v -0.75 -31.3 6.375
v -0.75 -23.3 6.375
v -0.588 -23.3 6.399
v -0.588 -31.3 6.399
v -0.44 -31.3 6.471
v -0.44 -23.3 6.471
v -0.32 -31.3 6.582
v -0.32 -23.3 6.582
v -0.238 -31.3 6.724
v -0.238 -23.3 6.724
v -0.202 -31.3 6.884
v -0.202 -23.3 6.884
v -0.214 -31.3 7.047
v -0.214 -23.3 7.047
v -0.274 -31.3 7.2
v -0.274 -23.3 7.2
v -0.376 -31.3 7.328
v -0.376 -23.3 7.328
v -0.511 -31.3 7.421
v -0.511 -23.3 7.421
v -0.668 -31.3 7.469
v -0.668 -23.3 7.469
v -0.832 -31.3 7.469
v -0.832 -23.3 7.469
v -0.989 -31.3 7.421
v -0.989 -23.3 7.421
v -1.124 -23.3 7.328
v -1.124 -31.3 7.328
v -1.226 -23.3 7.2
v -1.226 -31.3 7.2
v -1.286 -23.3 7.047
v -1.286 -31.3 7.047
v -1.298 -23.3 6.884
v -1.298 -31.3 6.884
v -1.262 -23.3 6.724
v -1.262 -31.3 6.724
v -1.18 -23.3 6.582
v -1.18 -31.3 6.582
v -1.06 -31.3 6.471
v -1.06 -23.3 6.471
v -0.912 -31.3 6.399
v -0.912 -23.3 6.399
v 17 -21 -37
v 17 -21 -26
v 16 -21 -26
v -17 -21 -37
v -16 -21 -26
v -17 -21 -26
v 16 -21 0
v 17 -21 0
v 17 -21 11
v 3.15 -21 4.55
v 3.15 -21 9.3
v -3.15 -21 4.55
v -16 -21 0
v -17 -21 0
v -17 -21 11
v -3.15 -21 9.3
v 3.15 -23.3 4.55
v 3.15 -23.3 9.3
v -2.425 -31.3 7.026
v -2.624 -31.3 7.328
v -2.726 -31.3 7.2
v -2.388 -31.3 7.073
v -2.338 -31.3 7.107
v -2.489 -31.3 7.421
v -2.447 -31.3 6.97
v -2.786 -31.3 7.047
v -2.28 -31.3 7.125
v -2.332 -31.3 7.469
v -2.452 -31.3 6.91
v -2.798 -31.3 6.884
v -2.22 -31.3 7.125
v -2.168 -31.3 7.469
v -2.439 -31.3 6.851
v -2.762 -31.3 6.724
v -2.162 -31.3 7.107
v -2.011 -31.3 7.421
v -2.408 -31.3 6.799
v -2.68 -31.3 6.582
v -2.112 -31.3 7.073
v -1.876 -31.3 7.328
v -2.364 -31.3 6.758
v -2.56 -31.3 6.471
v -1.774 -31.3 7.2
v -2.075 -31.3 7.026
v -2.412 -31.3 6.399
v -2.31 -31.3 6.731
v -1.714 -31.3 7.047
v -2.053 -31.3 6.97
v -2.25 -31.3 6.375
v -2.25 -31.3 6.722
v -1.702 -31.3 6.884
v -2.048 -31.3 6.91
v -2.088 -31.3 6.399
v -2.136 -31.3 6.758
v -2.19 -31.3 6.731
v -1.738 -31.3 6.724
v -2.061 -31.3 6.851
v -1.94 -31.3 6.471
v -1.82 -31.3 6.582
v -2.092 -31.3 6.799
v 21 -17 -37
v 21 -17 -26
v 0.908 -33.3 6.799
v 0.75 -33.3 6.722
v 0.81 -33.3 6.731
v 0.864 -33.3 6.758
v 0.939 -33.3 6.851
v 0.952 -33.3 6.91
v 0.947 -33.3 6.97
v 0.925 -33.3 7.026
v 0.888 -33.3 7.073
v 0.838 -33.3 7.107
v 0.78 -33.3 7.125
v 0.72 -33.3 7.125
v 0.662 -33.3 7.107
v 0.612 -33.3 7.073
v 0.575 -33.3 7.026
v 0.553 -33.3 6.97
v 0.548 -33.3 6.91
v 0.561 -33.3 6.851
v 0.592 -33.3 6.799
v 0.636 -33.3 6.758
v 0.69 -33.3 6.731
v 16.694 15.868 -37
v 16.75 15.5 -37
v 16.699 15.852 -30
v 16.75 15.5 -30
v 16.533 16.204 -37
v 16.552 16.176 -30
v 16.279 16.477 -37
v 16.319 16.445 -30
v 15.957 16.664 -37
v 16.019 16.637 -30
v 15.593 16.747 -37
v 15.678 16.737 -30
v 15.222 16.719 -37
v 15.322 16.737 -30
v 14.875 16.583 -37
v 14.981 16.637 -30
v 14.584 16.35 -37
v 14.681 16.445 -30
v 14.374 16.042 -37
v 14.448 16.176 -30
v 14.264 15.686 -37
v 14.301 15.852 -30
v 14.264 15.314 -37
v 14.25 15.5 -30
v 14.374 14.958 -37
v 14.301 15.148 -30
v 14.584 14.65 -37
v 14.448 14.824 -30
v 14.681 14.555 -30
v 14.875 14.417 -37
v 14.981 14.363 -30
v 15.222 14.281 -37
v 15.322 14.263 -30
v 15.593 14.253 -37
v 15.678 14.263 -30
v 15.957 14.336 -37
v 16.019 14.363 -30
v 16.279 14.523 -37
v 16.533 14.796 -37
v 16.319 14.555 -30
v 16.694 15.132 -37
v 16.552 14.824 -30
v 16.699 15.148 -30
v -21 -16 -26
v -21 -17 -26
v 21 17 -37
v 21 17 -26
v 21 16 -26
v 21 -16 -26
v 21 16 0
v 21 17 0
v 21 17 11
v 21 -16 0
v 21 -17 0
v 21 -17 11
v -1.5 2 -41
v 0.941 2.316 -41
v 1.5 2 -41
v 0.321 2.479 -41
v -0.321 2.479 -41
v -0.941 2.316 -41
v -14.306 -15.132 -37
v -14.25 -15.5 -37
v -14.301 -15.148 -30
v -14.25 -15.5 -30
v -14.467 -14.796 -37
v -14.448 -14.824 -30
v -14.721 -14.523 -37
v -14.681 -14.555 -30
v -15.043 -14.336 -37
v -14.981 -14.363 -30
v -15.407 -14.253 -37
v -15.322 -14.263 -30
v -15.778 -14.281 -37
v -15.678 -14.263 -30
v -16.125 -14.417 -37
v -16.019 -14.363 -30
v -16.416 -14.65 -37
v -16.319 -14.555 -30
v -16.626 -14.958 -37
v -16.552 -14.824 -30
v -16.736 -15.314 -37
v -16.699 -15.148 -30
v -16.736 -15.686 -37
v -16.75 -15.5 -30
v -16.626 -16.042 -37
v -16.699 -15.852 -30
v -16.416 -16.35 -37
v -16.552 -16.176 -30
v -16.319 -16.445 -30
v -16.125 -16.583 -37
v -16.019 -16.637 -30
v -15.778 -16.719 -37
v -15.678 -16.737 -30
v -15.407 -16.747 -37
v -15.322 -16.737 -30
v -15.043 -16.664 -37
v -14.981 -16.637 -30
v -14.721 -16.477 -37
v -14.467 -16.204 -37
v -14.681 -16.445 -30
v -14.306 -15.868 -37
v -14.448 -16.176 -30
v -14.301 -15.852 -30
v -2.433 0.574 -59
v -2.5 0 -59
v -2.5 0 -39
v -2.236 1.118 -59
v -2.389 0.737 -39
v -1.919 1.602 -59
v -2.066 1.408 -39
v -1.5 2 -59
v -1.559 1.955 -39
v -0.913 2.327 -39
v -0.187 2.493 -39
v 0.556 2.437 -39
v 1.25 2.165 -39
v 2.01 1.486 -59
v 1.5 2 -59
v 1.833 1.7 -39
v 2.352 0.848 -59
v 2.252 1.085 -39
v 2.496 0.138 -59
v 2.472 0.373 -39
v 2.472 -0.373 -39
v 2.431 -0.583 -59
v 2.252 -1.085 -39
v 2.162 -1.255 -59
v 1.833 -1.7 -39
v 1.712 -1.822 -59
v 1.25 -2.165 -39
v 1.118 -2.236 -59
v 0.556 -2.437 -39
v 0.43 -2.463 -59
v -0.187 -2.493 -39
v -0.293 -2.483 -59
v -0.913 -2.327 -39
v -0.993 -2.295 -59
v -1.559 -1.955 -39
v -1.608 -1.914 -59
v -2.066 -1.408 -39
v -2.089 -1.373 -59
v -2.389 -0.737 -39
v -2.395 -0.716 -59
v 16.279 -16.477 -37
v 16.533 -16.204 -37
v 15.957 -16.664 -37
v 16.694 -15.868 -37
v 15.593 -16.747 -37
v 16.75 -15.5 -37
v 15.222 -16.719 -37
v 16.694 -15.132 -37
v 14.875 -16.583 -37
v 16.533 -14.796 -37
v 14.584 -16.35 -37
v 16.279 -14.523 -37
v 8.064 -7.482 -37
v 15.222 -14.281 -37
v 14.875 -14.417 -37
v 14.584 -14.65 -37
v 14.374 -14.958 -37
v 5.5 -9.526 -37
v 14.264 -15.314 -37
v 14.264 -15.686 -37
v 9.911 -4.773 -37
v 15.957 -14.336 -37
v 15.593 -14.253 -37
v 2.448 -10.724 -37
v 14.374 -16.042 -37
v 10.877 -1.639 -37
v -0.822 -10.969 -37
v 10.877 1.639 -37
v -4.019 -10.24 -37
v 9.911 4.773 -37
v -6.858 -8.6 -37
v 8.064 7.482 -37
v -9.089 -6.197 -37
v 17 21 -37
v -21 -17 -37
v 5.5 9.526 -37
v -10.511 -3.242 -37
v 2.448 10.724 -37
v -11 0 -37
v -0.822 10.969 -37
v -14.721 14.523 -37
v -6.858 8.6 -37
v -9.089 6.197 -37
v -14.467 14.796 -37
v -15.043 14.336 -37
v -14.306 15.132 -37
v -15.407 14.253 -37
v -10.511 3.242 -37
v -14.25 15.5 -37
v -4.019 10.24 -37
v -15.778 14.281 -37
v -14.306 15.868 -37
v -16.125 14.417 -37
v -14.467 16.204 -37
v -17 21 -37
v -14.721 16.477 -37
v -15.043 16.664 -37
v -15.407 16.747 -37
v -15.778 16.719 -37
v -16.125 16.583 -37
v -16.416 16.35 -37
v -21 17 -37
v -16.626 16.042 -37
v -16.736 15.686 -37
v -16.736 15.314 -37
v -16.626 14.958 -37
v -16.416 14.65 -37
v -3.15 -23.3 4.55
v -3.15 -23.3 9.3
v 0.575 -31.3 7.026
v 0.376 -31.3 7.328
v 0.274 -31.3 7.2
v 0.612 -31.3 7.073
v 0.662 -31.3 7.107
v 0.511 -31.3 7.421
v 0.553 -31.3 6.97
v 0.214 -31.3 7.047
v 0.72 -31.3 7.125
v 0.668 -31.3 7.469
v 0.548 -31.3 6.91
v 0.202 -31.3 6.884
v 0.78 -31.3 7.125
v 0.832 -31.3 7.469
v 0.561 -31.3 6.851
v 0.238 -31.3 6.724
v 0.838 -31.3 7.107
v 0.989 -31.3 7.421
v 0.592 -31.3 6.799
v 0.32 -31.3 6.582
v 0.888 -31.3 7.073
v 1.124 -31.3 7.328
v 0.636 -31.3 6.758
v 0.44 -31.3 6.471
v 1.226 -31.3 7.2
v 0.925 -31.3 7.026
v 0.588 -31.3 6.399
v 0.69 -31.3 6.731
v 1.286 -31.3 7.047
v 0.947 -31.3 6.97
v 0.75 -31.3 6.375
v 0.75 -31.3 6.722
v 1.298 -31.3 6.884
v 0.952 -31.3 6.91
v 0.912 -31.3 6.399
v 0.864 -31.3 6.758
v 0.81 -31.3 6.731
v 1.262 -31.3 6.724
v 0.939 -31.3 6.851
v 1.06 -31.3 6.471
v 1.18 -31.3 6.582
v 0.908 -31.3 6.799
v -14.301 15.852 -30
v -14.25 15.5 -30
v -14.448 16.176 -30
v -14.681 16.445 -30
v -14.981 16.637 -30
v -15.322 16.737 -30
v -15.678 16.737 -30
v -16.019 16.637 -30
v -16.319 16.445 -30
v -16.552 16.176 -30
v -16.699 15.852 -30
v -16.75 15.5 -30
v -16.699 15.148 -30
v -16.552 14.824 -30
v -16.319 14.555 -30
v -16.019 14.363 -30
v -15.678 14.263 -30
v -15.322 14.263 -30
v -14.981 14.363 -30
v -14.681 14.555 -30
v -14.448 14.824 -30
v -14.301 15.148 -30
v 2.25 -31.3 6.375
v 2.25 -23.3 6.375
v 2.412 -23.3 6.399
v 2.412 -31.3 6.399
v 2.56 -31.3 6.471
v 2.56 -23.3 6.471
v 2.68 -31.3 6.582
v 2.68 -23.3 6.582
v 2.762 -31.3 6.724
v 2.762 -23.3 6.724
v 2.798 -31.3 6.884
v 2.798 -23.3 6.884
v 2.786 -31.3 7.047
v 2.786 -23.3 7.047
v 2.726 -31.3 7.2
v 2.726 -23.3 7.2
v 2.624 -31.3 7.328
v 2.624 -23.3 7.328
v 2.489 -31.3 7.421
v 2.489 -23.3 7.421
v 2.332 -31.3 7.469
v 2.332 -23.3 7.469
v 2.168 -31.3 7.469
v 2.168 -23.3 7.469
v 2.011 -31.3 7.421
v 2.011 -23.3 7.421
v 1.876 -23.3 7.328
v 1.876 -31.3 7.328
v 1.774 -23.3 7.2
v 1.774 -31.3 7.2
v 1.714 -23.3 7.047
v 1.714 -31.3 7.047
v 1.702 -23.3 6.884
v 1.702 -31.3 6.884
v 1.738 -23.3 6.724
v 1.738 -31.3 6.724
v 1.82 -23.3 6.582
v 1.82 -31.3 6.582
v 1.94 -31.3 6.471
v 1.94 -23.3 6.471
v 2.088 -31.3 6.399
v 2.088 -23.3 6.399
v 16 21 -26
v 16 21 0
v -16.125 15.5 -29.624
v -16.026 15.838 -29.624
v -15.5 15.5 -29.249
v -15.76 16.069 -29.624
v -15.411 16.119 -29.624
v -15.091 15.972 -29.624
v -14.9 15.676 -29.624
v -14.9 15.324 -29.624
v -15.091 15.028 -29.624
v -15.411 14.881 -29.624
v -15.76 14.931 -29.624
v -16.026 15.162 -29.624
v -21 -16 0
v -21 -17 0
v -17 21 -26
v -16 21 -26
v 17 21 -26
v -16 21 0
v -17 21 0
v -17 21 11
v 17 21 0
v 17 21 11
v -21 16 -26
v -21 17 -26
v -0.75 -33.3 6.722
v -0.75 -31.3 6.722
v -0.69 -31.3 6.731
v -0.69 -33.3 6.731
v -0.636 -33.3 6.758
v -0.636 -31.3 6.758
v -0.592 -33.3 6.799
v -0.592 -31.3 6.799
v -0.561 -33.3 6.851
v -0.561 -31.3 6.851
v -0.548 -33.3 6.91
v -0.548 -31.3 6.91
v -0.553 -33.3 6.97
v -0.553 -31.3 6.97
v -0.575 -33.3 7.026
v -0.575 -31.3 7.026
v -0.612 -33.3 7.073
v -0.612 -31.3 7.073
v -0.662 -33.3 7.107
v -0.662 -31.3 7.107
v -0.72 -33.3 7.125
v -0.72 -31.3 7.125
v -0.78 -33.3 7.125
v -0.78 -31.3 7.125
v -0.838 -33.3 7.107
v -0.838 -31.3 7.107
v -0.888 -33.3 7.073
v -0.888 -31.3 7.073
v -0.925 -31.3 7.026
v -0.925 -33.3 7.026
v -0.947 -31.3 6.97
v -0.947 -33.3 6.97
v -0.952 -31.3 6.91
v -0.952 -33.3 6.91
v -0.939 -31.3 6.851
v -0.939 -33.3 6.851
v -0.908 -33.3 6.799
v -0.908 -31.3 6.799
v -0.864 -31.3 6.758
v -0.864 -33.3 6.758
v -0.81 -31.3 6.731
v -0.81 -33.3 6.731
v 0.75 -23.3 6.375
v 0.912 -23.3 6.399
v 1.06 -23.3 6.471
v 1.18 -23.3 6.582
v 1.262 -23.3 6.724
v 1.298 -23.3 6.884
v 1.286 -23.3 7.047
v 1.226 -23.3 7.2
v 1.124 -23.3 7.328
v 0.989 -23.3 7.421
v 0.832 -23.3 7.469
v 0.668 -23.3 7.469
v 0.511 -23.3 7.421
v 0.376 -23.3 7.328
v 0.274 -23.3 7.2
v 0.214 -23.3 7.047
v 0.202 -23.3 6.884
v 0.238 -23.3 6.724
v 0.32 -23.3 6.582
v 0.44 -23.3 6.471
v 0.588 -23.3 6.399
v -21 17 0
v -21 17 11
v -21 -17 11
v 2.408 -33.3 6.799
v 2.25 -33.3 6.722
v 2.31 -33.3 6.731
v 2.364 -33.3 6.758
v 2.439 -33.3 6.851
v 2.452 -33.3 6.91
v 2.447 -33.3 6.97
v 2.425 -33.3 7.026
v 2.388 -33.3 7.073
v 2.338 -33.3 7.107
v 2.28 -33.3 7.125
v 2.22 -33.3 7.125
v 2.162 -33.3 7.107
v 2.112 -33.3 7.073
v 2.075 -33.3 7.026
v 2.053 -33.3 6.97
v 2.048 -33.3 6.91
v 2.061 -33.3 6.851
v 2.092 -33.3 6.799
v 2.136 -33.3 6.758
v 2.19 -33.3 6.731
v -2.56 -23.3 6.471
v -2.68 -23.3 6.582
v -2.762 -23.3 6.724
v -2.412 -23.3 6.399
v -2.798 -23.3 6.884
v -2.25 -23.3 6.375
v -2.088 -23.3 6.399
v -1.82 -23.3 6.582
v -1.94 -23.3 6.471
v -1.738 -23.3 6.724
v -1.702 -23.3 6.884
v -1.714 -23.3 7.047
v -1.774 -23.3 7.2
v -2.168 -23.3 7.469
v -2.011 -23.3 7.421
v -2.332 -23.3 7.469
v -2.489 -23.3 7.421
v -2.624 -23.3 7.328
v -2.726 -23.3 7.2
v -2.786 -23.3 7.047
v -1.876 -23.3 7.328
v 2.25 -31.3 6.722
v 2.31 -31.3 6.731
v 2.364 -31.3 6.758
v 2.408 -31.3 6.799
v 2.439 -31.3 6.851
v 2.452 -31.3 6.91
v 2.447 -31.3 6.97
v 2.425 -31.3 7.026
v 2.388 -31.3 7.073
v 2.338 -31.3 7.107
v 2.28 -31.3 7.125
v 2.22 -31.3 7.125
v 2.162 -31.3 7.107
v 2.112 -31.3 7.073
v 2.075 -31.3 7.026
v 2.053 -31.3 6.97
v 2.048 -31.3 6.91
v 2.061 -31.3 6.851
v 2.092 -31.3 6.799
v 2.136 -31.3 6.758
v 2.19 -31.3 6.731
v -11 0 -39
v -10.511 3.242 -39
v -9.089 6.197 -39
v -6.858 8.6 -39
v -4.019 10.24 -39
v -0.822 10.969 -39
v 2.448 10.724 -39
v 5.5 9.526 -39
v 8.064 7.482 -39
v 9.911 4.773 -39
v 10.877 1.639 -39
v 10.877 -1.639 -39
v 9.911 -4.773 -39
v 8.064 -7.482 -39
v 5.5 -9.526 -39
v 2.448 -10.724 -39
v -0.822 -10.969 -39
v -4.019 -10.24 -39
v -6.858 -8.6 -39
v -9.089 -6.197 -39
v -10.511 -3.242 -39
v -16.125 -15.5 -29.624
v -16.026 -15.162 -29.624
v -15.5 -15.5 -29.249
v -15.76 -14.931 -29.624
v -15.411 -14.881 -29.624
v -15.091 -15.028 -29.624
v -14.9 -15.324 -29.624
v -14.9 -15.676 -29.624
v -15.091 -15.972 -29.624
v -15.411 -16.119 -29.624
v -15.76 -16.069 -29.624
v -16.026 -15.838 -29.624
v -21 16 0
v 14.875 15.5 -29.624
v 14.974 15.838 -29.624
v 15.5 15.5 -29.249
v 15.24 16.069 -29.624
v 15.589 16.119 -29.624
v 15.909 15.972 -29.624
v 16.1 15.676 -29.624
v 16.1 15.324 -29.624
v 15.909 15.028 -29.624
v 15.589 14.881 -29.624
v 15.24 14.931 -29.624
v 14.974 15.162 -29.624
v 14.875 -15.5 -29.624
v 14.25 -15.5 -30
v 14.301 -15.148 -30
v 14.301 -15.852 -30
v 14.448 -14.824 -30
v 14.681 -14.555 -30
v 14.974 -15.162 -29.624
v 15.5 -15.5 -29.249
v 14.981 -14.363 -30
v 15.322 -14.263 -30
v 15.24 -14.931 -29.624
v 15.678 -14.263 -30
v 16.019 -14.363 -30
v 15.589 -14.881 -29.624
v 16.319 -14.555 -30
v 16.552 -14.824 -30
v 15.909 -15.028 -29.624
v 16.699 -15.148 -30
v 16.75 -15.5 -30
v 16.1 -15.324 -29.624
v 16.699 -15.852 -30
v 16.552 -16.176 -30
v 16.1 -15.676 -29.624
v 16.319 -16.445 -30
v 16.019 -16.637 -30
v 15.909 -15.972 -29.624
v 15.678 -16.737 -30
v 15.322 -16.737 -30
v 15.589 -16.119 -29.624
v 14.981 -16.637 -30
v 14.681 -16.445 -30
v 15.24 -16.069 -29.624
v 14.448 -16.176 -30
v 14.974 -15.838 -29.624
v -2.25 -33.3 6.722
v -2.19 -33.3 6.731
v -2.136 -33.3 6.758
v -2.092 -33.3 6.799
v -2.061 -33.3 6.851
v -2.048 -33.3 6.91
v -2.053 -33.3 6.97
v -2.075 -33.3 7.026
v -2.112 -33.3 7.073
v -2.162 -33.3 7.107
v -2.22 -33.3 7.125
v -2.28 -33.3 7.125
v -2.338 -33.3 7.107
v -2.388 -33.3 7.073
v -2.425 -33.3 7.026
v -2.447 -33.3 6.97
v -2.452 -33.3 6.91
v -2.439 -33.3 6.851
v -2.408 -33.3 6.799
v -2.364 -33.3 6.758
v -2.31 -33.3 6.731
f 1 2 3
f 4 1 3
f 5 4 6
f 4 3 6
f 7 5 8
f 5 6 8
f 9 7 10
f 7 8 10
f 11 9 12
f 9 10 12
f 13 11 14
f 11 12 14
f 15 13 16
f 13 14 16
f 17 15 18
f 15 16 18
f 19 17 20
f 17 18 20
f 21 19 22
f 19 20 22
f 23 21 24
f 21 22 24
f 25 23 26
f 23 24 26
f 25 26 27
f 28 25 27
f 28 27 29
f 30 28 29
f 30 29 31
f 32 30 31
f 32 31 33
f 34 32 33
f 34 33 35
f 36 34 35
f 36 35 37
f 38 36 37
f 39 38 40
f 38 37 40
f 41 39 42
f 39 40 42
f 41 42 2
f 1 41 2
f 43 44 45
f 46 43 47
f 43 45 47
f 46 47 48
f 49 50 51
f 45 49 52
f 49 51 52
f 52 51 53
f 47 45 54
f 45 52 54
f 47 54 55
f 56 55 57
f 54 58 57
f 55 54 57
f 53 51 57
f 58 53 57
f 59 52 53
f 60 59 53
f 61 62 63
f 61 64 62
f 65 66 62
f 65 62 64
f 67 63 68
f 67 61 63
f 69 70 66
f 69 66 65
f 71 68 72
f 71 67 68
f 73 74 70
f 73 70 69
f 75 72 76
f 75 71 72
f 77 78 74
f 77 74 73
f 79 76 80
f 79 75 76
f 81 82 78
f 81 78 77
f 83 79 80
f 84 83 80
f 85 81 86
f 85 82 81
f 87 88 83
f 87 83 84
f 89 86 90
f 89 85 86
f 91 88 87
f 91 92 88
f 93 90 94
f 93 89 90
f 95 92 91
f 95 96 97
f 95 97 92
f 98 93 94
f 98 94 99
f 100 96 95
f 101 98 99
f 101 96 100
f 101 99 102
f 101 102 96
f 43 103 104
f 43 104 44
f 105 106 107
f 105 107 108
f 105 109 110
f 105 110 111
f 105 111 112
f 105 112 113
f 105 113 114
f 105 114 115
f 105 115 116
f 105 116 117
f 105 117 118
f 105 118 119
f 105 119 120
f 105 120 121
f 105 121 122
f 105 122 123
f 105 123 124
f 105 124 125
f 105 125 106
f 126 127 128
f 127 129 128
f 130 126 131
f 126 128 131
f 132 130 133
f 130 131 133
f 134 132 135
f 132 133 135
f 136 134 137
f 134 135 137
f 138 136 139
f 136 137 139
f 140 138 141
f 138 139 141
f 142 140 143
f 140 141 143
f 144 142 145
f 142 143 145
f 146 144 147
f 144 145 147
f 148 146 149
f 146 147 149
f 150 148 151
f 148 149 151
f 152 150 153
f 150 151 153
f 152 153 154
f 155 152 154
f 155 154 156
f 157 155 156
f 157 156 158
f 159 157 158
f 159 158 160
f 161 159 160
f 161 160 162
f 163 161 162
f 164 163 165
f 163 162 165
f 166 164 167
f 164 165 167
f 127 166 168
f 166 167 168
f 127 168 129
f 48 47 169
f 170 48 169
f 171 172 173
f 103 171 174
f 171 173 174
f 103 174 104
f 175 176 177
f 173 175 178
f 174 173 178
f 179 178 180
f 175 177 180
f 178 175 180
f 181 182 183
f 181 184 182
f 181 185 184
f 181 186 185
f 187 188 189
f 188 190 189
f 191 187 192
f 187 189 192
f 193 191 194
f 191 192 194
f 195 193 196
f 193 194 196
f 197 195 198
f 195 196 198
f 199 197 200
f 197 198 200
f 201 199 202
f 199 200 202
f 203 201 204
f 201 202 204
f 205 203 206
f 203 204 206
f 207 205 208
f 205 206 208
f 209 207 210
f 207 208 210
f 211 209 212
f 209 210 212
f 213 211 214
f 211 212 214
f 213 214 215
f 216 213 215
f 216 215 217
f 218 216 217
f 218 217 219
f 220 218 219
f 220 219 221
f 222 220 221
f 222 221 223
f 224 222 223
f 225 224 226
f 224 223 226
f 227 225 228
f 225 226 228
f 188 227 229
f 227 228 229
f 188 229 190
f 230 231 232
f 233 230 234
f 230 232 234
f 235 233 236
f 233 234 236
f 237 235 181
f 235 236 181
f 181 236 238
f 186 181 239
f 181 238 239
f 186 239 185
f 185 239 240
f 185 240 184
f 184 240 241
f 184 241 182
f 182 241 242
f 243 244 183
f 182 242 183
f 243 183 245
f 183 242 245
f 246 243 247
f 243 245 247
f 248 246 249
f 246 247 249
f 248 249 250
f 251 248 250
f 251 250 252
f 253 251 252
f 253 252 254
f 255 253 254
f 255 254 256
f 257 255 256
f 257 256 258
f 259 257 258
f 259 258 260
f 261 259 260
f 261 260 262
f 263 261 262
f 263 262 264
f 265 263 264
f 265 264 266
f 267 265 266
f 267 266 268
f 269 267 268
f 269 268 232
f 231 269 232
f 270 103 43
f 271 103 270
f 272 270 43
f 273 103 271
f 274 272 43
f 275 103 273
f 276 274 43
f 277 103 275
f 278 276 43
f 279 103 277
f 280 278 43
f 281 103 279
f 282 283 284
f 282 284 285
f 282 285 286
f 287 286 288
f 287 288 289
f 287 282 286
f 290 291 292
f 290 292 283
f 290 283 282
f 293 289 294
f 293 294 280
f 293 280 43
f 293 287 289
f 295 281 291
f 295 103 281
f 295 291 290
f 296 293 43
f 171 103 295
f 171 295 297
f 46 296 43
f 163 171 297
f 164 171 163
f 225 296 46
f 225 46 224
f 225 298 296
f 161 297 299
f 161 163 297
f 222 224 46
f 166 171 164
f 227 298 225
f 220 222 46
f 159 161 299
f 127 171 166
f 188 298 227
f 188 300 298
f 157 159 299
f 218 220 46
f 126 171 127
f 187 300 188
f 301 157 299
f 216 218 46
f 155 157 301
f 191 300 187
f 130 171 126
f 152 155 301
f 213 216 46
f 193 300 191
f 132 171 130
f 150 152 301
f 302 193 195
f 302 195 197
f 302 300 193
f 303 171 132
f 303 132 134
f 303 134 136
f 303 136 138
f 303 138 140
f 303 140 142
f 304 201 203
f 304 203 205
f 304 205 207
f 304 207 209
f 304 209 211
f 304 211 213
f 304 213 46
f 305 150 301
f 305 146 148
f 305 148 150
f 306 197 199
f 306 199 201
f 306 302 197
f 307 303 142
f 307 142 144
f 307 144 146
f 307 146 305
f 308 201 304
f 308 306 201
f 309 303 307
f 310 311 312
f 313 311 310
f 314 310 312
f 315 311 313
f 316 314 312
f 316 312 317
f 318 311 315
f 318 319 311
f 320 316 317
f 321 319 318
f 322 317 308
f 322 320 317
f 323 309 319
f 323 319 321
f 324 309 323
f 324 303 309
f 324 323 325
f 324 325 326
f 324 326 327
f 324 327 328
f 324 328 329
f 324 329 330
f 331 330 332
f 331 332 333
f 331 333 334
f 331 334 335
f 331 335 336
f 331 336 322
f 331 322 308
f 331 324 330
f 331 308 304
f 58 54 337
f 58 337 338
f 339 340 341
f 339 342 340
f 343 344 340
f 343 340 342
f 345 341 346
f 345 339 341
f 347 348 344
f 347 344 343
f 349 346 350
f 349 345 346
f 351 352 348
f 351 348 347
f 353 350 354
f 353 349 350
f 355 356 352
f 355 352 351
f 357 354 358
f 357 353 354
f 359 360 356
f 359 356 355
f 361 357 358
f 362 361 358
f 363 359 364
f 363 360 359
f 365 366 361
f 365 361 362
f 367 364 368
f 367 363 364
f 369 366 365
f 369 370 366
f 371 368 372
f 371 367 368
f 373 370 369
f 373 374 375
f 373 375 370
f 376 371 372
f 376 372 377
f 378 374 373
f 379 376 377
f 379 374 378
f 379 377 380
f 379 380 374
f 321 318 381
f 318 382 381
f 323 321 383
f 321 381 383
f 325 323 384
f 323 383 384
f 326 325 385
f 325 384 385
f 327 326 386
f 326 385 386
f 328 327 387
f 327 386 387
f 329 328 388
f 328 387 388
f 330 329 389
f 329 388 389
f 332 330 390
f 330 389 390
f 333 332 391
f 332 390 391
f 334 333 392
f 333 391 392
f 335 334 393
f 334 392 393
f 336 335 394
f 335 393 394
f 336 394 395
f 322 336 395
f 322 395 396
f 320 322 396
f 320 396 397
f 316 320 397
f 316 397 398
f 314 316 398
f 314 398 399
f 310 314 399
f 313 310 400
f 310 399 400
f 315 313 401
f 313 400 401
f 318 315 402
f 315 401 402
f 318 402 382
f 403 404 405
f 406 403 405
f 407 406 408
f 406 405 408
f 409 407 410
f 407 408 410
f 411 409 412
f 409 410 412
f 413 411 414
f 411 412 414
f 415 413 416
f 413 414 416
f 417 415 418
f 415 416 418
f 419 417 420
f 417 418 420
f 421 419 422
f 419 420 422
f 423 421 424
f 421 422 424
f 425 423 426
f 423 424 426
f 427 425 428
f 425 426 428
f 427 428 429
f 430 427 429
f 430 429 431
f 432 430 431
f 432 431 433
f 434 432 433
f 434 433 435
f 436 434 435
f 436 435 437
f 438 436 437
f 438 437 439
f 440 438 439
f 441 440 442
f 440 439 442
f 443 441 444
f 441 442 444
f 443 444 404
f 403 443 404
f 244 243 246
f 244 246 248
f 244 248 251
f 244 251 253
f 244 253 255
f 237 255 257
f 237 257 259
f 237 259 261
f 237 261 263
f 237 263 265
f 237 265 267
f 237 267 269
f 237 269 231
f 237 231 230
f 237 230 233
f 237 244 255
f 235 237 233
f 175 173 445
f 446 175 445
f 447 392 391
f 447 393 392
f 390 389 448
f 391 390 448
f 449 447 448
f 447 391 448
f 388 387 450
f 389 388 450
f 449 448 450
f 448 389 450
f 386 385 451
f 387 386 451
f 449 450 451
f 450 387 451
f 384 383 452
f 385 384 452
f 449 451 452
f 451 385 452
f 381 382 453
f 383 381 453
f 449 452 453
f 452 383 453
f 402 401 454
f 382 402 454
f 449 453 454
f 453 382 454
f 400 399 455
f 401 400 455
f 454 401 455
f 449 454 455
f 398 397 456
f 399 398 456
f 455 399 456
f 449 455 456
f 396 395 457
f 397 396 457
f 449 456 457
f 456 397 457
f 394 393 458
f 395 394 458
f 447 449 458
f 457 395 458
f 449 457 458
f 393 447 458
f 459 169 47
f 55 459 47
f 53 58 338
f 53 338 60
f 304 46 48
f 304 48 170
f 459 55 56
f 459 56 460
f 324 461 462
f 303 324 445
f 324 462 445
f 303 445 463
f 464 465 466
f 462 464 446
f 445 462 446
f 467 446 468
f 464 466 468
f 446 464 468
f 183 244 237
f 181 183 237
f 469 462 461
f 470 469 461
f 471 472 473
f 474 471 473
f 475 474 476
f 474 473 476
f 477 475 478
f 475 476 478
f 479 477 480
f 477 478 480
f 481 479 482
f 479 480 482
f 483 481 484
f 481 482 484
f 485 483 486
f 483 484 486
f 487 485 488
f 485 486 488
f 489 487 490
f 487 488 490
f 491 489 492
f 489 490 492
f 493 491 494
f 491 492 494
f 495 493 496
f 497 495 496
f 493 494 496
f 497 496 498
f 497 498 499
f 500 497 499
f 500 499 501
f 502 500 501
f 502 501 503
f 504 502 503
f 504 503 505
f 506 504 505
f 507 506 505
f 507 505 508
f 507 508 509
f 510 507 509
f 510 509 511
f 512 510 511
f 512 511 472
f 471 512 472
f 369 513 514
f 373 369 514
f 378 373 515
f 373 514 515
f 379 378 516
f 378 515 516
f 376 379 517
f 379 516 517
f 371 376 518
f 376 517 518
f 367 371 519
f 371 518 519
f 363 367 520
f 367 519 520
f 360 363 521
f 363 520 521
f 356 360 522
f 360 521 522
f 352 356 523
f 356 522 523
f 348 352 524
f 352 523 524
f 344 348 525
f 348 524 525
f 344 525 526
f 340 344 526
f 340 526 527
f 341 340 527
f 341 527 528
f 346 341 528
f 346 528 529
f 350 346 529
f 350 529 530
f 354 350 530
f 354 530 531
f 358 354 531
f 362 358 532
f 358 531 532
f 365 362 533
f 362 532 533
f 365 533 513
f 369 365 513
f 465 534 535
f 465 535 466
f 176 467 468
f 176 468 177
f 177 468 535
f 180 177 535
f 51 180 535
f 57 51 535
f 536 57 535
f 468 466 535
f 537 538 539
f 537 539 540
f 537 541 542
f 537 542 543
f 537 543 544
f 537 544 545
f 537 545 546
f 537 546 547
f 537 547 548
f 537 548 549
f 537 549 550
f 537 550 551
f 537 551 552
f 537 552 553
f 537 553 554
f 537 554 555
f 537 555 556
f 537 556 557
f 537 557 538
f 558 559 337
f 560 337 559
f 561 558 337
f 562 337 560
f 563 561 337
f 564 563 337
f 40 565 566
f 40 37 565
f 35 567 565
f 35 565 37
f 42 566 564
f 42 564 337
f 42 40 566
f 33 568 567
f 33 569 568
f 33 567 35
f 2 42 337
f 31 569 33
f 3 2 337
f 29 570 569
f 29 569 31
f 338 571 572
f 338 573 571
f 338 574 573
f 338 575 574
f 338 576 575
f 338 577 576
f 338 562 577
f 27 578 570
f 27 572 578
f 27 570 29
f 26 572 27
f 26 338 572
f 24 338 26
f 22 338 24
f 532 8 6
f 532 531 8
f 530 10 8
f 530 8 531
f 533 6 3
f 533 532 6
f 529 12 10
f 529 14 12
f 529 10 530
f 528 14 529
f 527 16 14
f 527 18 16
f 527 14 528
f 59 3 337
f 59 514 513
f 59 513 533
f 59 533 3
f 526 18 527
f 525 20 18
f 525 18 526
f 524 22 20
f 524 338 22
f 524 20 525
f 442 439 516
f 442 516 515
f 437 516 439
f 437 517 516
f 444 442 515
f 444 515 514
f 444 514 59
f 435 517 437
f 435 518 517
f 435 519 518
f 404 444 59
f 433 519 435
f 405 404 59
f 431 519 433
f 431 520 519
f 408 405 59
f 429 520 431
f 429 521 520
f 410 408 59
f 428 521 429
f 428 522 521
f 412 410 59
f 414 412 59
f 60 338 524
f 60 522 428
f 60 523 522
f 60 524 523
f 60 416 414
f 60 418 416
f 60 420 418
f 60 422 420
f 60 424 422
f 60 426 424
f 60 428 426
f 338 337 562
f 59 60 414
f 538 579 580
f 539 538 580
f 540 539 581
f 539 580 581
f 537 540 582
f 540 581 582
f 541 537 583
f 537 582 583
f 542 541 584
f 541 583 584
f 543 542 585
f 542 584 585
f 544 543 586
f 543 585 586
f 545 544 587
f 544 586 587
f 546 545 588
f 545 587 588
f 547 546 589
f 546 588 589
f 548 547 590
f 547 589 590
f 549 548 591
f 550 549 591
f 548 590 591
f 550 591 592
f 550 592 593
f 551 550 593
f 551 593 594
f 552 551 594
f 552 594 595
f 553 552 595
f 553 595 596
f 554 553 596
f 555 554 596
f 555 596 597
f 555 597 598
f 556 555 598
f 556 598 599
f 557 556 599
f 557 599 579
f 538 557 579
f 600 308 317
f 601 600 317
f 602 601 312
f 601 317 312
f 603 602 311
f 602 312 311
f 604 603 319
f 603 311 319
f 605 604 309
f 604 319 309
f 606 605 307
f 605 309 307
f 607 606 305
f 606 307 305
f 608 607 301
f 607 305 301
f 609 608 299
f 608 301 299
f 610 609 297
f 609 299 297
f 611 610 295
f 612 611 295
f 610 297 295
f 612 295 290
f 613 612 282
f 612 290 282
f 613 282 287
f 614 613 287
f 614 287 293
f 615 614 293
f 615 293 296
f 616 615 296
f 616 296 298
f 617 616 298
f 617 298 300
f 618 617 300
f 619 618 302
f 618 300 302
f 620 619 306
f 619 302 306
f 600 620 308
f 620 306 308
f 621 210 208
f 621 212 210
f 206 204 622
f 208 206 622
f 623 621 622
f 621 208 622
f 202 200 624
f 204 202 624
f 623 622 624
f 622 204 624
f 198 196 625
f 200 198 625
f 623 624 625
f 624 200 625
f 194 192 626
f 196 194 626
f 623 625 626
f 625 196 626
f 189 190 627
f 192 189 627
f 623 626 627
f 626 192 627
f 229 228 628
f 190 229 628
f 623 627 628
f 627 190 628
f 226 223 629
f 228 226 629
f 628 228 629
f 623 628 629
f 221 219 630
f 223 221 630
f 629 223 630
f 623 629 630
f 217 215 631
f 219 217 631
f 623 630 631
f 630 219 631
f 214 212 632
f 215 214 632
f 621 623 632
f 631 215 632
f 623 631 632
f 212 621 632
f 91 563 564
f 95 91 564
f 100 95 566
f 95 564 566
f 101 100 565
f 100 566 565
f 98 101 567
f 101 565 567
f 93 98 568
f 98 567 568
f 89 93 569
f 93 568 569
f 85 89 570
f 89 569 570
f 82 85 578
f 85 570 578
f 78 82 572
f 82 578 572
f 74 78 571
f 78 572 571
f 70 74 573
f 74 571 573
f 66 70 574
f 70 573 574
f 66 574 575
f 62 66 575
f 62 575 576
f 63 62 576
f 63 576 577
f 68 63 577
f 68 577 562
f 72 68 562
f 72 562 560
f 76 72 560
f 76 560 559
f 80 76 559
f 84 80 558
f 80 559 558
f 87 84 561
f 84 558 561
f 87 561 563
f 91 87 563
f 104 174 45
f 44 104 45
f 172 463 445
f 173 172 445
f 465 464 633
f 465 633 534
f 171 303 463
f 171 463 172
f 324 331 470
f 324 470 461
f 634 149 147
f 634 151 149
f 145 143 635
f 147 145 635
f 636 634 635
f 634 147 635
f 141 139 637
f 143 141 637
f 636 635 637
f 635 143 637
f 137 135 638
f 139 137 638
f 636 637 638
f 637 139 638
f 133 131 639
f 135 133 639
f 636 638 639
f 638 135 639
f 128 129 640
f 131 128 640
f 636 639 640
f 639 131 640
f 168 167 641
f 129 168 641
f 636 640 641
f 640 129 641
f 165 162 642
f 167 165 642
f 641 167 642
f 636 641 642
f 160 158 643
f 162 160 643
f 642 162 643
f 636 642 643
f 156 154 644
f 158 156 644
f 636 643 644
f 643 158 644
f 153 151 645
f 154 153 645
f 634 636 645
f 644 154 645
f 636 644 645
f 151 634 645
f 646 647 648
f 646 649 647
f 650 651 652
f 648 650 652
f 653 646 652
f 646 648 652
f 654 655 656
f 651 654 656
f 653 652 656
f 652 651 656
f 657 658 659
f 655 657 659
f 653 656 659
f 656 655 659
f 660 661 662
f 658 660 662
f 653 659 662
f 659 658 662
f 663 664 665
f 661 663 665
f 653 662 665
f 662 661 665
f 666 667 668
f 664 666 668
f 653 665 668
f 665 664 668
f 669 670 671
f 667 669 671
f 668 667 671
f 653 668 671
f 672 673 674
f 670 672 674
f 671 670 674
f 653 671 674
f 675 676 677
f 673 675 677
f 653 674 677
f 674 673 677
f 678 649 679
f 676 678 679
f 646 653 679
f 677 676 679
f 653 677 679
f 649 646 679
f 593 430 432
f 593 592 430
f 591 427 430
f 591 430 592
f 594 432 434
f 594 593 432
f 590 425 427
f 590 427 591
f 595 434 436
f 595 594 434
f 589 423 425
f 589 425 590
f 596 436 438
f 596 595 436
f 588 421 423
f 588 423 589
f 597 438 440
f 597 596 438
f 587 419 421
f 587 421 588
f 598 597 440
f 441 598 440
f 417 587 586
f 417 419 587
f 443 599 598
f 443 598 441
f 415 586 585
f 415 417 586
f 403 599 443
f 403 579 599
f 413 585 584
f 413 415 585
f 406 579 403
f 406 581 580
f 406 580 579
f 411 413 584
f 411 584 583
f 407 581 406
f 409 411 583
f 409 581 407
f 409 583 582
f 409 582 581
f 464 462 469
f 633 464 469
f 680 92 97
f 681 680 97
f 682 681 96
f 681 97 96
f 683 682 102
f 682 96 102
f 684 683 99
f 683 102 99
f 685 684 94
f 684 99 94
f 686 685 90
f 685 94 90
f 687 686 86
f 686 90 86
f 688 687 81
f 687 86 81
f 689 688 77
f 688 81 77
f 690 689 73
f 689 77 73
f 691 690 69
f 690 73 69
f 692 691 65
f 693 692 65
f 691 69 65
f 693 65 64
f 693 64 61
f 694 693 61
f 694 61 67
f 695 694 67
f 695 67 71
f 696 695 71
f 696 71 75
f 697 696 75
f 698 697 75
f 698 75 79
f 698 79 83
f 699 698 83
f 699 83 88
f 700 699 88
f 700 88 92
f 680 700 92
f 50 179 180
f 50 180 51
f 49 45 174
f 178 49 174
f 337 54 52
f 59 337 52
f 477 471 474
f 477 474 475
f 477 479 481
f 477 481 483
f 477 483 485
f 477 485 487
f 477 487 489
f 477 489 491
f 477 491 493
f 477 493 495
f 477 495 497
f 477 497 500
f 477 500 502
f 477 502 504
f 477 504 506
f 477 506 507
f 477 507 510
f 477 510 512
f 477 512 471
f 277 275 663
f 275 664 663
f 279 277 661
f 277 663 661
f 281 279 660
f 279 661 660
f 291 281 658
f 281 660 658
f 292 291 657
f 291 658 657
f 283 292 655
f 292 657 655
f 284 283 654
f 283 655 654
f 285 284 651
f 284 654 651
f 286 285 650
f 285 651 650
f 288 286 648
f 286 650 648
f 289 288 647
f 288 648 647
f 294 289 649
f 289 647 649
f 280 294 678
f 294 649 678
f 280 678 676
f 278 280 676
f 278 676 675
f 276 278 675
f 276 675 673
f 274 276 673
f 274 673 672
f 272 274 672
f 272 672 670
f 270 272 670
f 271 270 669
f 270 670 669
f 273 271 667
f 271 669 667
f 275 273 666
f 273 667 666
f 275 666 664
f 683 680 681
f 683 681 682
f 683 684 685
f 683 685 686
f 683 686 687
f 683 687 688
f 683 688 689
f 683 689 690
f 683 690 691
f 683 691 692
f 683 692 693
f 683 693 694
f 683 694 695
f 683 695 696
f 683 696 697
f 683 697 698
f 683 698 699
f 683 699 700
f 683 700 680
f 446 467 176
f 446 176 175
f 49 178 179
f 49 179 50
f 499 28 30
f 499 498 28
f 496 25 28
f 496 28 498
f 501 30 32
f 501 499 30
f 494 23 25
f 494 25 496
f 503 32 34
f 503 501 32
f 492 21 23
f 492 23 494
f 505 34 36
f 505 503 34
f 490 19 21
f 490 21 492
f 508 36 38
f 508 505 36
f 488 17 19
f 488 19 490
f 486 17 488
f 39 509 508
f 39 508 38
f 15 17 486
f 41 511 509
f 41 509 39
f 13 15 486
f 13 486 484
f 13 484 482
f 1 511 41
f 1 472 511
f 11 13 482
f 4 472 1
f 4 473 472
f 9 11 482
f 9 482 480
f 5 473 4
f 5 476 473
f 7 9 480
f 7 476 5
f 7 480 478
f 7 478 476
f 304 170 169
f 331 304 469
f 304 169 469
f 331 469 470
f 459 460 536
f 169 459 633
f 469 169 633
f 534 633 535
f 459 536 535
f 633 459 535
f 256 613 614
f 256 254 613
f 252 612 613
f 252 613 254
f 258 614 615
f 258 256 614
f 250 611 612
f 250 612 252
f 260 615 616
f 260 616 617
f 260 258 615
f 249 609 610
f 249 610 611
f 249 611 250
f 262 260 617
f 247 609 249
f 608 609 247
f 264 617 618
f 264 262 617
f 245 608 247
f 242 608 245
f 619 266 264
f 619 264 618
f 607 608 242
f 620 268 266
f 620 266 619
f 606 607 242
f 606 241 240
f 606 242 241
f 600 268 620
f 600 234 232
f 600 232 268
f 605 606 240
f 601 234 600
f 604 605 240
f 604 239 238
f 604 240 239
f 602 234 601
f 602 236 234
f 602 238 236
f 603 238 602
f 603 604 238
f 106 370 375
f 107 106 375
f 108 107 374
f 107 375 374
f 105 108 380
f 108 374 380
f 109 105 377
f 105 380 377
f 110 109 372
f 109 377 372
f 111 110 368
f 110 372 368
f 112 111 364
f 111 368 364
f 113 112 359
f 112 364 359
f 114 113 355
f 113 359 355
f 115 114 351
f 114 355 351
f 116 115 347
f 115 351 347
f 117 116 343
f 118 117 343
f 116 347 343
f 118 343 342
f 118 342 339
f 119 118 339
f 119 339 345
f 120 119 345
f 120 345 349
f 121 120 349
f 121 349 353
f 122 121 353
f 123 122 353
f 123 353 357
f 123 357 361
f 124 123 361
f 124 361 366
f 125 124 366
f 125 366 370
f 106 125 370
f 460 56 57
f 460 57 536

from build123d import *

# Parameters (mm, degrees)
BOSS_EXTRU_1_DEPTH      = 11
BOSS_EXTRU_2_DEPTH      = 26
BOSS_EXTRU_3_DEPTH      = 11
ESQUISSE4_R             = 11
BOSS_EXTRU_4_DEPTH      = 2
ESQUISSE5_R             = 2.5
BOSS_EXTRU_5_DEPTH      = 20
ESQUISSE6_W             = 5.798316384
ESQUISSE6_H             = 1
ENL_V_MAT_EXTRU_1_DEPTH = 18
TROU_TARAUD_M31_D       = 2.5
TROU_TARAUD_M31_DEPTH   = 7
TROU_TARAUD_M31_TIP     = 0.751075774
ESQUISSE9_W             = 6.3
ESQUISSE9_H             = 4.75
BOSS_EXTRU_6_DEPTH      = 2.3
ESQUISSE10_R            = 0.2025
BOSS_EXTRU_7_DEPTH      = 10
ESQUISSE11_R            = 0.55
BOSS_EXTRU_8_DEPTH      = 8


with BuildPart() as part:
    # Esquisse1 → Boss.-Extru.1 (new body)
    with BuildSketch(Plane.XY):
        Polygon((17, 21), (21, 17), (21, -17), (17, -21), (-17, -21), (-21, -17), (-21, 17), (-17, 21), align=None)
    extrude(amount=BOSS_EXTRU_1_DEPTH)

    # Esquisse2 → Boss.-Extru.2 (add)
    with BuildSketch(Plane(origin=(0, 0, 0), x_dir=(-1, 0, 0), z_dir=(0, 0, -1))):
        Polygon((-16, 21), (16, 21), (21, 16), (21, -16), (16, -21), (-16, -21), (-21, -16), (-21, 16), align=None)
    extrude(amount=BOSS_EXTRU_2_DEPTH)

    # Esquisse3 → Boss.-Extru.3 (add)
    with BuildSketch(Plane(origin=(0, 0, -26), x_dir=(-1, 0, 0), z_dir=(0, 0, -1))):
        Polygon((-17, 21), (-21, 17), (-21, -17), (-17, -21), (17, -21), (21, -17), (21, 17), (17, 21), align=None)
    extrude(amount=BOSS_EXTRU_3_DEPTH)

    # Esquisse4 → Boss.-Extru.4 (add)
    with BuildSketch(Plane(origin=(0, 0, -37), x_dir=(-1, 0, 0), z_dir=(0, 0, -1))):
        Circle(ESQUISSE4_R)
    extrude(amount=BOSS_EXTRU_4_DEPTH)

    # Esquisse5 → Boss.-Extru.5 (add)
    with BuildSketch(Plane(origin=(0, 0, -39), x_dir=(-1, 0, 0), z_dir=(0, 0, -1))):
        Circle(ESQUISSE5_R)
    extrude(amount=BOSS_EXTRU_5_DEPTH)

    # Esquisse6 → Enlèv. mat.-Extru.1 (cut)
    with BuildSketch(Plane(origin=(0, 0, -59), x_dir=(-1, 0, 0), z_dir=(0, 0, -1))):
        with Locations((0, 2.5)):
            Rectangle(ESQUISSE6_W, ESQUISSE6_H)
    extrude(amount=-ENL_V_MAT_EXTRU_1_DEPTH, mode=Mode.SUBTRACT)

    # Trou taraudé M31
    with Locations(Plane(origin=(0, 0, -37), x_dir=(-1, 0, 0), z_dir=(0, 0, -1))):
        with Locations((-15.5, 15.5), (15.5, 15.5), (15.5, -15.5), (-15.5, -15.5)):
            Hole(TROU_TARAUD_M31_D / 2, depth=TROU_TARAUD_M31_DEPTH)
            with Locations((0, 0, -(TROU_TARAUD_M31_DEPTH + TROU_TARAUD_M31_TIP / 2))):  # 118° drill point
                Cone(0, TROU_TARAUD_M31_D / 2, TROU_TARAUD_M31_TIP, mode=Mode.SUBTRACT)

    # Esquisse9 → Boss.-Extru.6 (add)
    with BuildSketch(Plane.XZ.offset(21)):
        with Locations((0, 6.925)):
            Rectangle(ESQUISSE9_W, ESQUISSE9_H)
    extrude(amount=BOSS_EXTRU_6_DEPTH)

    # Esquisse10 → Boss.-Extru.7 (add)
    with BuildSketch(Plane.XZ.offset(23.3)):
        with Locations(Location((-2.25, 6.925, 0), (0, 0, 270))):
            Circle(ESQUISSE10_R)
        with Locations(Location((-0.75, 6.925, 0), (0, 0, 270))):
            Circle(ESQUISSE10_R)
        with Locations(Location((0.75, 6.925, 0), (0, 0, 270))):
            Circle(ESQUISSE10_R)
        with Locations(Location((2.25, 6.925, 0), (0, 0, 270))):
            Circle(ESQUISSE10_R)
    extrude(amount=BOSS_EXTRU_7_DEPTH)

    # Esquisse11 → Boss.-Extru.8 (add)
    with BuildSketch(Plane.XZ.offset(23.3)):
        with Locations(Location((-2.25, 6.925, 0), (0, 0, 270))):
            Circle(ESQUISSE11_R)
        with Locations(Location((-0.75, 6.925, 0), (0, 0, 270))):
            Circle(ESQUISSE11_R)
        with Locations(Location((0.75, 6.925, 0), (0, 0, 270))):
            Circle(ESQUISSE11_R)
        with Locations(Location((2.25, 6.925, 0), (0, 0, 270))):
            Circle(ESQUISSE11_R)
    extrude(amount=BOSS_EXTRU_8_DEPTH)


solid = part.part
